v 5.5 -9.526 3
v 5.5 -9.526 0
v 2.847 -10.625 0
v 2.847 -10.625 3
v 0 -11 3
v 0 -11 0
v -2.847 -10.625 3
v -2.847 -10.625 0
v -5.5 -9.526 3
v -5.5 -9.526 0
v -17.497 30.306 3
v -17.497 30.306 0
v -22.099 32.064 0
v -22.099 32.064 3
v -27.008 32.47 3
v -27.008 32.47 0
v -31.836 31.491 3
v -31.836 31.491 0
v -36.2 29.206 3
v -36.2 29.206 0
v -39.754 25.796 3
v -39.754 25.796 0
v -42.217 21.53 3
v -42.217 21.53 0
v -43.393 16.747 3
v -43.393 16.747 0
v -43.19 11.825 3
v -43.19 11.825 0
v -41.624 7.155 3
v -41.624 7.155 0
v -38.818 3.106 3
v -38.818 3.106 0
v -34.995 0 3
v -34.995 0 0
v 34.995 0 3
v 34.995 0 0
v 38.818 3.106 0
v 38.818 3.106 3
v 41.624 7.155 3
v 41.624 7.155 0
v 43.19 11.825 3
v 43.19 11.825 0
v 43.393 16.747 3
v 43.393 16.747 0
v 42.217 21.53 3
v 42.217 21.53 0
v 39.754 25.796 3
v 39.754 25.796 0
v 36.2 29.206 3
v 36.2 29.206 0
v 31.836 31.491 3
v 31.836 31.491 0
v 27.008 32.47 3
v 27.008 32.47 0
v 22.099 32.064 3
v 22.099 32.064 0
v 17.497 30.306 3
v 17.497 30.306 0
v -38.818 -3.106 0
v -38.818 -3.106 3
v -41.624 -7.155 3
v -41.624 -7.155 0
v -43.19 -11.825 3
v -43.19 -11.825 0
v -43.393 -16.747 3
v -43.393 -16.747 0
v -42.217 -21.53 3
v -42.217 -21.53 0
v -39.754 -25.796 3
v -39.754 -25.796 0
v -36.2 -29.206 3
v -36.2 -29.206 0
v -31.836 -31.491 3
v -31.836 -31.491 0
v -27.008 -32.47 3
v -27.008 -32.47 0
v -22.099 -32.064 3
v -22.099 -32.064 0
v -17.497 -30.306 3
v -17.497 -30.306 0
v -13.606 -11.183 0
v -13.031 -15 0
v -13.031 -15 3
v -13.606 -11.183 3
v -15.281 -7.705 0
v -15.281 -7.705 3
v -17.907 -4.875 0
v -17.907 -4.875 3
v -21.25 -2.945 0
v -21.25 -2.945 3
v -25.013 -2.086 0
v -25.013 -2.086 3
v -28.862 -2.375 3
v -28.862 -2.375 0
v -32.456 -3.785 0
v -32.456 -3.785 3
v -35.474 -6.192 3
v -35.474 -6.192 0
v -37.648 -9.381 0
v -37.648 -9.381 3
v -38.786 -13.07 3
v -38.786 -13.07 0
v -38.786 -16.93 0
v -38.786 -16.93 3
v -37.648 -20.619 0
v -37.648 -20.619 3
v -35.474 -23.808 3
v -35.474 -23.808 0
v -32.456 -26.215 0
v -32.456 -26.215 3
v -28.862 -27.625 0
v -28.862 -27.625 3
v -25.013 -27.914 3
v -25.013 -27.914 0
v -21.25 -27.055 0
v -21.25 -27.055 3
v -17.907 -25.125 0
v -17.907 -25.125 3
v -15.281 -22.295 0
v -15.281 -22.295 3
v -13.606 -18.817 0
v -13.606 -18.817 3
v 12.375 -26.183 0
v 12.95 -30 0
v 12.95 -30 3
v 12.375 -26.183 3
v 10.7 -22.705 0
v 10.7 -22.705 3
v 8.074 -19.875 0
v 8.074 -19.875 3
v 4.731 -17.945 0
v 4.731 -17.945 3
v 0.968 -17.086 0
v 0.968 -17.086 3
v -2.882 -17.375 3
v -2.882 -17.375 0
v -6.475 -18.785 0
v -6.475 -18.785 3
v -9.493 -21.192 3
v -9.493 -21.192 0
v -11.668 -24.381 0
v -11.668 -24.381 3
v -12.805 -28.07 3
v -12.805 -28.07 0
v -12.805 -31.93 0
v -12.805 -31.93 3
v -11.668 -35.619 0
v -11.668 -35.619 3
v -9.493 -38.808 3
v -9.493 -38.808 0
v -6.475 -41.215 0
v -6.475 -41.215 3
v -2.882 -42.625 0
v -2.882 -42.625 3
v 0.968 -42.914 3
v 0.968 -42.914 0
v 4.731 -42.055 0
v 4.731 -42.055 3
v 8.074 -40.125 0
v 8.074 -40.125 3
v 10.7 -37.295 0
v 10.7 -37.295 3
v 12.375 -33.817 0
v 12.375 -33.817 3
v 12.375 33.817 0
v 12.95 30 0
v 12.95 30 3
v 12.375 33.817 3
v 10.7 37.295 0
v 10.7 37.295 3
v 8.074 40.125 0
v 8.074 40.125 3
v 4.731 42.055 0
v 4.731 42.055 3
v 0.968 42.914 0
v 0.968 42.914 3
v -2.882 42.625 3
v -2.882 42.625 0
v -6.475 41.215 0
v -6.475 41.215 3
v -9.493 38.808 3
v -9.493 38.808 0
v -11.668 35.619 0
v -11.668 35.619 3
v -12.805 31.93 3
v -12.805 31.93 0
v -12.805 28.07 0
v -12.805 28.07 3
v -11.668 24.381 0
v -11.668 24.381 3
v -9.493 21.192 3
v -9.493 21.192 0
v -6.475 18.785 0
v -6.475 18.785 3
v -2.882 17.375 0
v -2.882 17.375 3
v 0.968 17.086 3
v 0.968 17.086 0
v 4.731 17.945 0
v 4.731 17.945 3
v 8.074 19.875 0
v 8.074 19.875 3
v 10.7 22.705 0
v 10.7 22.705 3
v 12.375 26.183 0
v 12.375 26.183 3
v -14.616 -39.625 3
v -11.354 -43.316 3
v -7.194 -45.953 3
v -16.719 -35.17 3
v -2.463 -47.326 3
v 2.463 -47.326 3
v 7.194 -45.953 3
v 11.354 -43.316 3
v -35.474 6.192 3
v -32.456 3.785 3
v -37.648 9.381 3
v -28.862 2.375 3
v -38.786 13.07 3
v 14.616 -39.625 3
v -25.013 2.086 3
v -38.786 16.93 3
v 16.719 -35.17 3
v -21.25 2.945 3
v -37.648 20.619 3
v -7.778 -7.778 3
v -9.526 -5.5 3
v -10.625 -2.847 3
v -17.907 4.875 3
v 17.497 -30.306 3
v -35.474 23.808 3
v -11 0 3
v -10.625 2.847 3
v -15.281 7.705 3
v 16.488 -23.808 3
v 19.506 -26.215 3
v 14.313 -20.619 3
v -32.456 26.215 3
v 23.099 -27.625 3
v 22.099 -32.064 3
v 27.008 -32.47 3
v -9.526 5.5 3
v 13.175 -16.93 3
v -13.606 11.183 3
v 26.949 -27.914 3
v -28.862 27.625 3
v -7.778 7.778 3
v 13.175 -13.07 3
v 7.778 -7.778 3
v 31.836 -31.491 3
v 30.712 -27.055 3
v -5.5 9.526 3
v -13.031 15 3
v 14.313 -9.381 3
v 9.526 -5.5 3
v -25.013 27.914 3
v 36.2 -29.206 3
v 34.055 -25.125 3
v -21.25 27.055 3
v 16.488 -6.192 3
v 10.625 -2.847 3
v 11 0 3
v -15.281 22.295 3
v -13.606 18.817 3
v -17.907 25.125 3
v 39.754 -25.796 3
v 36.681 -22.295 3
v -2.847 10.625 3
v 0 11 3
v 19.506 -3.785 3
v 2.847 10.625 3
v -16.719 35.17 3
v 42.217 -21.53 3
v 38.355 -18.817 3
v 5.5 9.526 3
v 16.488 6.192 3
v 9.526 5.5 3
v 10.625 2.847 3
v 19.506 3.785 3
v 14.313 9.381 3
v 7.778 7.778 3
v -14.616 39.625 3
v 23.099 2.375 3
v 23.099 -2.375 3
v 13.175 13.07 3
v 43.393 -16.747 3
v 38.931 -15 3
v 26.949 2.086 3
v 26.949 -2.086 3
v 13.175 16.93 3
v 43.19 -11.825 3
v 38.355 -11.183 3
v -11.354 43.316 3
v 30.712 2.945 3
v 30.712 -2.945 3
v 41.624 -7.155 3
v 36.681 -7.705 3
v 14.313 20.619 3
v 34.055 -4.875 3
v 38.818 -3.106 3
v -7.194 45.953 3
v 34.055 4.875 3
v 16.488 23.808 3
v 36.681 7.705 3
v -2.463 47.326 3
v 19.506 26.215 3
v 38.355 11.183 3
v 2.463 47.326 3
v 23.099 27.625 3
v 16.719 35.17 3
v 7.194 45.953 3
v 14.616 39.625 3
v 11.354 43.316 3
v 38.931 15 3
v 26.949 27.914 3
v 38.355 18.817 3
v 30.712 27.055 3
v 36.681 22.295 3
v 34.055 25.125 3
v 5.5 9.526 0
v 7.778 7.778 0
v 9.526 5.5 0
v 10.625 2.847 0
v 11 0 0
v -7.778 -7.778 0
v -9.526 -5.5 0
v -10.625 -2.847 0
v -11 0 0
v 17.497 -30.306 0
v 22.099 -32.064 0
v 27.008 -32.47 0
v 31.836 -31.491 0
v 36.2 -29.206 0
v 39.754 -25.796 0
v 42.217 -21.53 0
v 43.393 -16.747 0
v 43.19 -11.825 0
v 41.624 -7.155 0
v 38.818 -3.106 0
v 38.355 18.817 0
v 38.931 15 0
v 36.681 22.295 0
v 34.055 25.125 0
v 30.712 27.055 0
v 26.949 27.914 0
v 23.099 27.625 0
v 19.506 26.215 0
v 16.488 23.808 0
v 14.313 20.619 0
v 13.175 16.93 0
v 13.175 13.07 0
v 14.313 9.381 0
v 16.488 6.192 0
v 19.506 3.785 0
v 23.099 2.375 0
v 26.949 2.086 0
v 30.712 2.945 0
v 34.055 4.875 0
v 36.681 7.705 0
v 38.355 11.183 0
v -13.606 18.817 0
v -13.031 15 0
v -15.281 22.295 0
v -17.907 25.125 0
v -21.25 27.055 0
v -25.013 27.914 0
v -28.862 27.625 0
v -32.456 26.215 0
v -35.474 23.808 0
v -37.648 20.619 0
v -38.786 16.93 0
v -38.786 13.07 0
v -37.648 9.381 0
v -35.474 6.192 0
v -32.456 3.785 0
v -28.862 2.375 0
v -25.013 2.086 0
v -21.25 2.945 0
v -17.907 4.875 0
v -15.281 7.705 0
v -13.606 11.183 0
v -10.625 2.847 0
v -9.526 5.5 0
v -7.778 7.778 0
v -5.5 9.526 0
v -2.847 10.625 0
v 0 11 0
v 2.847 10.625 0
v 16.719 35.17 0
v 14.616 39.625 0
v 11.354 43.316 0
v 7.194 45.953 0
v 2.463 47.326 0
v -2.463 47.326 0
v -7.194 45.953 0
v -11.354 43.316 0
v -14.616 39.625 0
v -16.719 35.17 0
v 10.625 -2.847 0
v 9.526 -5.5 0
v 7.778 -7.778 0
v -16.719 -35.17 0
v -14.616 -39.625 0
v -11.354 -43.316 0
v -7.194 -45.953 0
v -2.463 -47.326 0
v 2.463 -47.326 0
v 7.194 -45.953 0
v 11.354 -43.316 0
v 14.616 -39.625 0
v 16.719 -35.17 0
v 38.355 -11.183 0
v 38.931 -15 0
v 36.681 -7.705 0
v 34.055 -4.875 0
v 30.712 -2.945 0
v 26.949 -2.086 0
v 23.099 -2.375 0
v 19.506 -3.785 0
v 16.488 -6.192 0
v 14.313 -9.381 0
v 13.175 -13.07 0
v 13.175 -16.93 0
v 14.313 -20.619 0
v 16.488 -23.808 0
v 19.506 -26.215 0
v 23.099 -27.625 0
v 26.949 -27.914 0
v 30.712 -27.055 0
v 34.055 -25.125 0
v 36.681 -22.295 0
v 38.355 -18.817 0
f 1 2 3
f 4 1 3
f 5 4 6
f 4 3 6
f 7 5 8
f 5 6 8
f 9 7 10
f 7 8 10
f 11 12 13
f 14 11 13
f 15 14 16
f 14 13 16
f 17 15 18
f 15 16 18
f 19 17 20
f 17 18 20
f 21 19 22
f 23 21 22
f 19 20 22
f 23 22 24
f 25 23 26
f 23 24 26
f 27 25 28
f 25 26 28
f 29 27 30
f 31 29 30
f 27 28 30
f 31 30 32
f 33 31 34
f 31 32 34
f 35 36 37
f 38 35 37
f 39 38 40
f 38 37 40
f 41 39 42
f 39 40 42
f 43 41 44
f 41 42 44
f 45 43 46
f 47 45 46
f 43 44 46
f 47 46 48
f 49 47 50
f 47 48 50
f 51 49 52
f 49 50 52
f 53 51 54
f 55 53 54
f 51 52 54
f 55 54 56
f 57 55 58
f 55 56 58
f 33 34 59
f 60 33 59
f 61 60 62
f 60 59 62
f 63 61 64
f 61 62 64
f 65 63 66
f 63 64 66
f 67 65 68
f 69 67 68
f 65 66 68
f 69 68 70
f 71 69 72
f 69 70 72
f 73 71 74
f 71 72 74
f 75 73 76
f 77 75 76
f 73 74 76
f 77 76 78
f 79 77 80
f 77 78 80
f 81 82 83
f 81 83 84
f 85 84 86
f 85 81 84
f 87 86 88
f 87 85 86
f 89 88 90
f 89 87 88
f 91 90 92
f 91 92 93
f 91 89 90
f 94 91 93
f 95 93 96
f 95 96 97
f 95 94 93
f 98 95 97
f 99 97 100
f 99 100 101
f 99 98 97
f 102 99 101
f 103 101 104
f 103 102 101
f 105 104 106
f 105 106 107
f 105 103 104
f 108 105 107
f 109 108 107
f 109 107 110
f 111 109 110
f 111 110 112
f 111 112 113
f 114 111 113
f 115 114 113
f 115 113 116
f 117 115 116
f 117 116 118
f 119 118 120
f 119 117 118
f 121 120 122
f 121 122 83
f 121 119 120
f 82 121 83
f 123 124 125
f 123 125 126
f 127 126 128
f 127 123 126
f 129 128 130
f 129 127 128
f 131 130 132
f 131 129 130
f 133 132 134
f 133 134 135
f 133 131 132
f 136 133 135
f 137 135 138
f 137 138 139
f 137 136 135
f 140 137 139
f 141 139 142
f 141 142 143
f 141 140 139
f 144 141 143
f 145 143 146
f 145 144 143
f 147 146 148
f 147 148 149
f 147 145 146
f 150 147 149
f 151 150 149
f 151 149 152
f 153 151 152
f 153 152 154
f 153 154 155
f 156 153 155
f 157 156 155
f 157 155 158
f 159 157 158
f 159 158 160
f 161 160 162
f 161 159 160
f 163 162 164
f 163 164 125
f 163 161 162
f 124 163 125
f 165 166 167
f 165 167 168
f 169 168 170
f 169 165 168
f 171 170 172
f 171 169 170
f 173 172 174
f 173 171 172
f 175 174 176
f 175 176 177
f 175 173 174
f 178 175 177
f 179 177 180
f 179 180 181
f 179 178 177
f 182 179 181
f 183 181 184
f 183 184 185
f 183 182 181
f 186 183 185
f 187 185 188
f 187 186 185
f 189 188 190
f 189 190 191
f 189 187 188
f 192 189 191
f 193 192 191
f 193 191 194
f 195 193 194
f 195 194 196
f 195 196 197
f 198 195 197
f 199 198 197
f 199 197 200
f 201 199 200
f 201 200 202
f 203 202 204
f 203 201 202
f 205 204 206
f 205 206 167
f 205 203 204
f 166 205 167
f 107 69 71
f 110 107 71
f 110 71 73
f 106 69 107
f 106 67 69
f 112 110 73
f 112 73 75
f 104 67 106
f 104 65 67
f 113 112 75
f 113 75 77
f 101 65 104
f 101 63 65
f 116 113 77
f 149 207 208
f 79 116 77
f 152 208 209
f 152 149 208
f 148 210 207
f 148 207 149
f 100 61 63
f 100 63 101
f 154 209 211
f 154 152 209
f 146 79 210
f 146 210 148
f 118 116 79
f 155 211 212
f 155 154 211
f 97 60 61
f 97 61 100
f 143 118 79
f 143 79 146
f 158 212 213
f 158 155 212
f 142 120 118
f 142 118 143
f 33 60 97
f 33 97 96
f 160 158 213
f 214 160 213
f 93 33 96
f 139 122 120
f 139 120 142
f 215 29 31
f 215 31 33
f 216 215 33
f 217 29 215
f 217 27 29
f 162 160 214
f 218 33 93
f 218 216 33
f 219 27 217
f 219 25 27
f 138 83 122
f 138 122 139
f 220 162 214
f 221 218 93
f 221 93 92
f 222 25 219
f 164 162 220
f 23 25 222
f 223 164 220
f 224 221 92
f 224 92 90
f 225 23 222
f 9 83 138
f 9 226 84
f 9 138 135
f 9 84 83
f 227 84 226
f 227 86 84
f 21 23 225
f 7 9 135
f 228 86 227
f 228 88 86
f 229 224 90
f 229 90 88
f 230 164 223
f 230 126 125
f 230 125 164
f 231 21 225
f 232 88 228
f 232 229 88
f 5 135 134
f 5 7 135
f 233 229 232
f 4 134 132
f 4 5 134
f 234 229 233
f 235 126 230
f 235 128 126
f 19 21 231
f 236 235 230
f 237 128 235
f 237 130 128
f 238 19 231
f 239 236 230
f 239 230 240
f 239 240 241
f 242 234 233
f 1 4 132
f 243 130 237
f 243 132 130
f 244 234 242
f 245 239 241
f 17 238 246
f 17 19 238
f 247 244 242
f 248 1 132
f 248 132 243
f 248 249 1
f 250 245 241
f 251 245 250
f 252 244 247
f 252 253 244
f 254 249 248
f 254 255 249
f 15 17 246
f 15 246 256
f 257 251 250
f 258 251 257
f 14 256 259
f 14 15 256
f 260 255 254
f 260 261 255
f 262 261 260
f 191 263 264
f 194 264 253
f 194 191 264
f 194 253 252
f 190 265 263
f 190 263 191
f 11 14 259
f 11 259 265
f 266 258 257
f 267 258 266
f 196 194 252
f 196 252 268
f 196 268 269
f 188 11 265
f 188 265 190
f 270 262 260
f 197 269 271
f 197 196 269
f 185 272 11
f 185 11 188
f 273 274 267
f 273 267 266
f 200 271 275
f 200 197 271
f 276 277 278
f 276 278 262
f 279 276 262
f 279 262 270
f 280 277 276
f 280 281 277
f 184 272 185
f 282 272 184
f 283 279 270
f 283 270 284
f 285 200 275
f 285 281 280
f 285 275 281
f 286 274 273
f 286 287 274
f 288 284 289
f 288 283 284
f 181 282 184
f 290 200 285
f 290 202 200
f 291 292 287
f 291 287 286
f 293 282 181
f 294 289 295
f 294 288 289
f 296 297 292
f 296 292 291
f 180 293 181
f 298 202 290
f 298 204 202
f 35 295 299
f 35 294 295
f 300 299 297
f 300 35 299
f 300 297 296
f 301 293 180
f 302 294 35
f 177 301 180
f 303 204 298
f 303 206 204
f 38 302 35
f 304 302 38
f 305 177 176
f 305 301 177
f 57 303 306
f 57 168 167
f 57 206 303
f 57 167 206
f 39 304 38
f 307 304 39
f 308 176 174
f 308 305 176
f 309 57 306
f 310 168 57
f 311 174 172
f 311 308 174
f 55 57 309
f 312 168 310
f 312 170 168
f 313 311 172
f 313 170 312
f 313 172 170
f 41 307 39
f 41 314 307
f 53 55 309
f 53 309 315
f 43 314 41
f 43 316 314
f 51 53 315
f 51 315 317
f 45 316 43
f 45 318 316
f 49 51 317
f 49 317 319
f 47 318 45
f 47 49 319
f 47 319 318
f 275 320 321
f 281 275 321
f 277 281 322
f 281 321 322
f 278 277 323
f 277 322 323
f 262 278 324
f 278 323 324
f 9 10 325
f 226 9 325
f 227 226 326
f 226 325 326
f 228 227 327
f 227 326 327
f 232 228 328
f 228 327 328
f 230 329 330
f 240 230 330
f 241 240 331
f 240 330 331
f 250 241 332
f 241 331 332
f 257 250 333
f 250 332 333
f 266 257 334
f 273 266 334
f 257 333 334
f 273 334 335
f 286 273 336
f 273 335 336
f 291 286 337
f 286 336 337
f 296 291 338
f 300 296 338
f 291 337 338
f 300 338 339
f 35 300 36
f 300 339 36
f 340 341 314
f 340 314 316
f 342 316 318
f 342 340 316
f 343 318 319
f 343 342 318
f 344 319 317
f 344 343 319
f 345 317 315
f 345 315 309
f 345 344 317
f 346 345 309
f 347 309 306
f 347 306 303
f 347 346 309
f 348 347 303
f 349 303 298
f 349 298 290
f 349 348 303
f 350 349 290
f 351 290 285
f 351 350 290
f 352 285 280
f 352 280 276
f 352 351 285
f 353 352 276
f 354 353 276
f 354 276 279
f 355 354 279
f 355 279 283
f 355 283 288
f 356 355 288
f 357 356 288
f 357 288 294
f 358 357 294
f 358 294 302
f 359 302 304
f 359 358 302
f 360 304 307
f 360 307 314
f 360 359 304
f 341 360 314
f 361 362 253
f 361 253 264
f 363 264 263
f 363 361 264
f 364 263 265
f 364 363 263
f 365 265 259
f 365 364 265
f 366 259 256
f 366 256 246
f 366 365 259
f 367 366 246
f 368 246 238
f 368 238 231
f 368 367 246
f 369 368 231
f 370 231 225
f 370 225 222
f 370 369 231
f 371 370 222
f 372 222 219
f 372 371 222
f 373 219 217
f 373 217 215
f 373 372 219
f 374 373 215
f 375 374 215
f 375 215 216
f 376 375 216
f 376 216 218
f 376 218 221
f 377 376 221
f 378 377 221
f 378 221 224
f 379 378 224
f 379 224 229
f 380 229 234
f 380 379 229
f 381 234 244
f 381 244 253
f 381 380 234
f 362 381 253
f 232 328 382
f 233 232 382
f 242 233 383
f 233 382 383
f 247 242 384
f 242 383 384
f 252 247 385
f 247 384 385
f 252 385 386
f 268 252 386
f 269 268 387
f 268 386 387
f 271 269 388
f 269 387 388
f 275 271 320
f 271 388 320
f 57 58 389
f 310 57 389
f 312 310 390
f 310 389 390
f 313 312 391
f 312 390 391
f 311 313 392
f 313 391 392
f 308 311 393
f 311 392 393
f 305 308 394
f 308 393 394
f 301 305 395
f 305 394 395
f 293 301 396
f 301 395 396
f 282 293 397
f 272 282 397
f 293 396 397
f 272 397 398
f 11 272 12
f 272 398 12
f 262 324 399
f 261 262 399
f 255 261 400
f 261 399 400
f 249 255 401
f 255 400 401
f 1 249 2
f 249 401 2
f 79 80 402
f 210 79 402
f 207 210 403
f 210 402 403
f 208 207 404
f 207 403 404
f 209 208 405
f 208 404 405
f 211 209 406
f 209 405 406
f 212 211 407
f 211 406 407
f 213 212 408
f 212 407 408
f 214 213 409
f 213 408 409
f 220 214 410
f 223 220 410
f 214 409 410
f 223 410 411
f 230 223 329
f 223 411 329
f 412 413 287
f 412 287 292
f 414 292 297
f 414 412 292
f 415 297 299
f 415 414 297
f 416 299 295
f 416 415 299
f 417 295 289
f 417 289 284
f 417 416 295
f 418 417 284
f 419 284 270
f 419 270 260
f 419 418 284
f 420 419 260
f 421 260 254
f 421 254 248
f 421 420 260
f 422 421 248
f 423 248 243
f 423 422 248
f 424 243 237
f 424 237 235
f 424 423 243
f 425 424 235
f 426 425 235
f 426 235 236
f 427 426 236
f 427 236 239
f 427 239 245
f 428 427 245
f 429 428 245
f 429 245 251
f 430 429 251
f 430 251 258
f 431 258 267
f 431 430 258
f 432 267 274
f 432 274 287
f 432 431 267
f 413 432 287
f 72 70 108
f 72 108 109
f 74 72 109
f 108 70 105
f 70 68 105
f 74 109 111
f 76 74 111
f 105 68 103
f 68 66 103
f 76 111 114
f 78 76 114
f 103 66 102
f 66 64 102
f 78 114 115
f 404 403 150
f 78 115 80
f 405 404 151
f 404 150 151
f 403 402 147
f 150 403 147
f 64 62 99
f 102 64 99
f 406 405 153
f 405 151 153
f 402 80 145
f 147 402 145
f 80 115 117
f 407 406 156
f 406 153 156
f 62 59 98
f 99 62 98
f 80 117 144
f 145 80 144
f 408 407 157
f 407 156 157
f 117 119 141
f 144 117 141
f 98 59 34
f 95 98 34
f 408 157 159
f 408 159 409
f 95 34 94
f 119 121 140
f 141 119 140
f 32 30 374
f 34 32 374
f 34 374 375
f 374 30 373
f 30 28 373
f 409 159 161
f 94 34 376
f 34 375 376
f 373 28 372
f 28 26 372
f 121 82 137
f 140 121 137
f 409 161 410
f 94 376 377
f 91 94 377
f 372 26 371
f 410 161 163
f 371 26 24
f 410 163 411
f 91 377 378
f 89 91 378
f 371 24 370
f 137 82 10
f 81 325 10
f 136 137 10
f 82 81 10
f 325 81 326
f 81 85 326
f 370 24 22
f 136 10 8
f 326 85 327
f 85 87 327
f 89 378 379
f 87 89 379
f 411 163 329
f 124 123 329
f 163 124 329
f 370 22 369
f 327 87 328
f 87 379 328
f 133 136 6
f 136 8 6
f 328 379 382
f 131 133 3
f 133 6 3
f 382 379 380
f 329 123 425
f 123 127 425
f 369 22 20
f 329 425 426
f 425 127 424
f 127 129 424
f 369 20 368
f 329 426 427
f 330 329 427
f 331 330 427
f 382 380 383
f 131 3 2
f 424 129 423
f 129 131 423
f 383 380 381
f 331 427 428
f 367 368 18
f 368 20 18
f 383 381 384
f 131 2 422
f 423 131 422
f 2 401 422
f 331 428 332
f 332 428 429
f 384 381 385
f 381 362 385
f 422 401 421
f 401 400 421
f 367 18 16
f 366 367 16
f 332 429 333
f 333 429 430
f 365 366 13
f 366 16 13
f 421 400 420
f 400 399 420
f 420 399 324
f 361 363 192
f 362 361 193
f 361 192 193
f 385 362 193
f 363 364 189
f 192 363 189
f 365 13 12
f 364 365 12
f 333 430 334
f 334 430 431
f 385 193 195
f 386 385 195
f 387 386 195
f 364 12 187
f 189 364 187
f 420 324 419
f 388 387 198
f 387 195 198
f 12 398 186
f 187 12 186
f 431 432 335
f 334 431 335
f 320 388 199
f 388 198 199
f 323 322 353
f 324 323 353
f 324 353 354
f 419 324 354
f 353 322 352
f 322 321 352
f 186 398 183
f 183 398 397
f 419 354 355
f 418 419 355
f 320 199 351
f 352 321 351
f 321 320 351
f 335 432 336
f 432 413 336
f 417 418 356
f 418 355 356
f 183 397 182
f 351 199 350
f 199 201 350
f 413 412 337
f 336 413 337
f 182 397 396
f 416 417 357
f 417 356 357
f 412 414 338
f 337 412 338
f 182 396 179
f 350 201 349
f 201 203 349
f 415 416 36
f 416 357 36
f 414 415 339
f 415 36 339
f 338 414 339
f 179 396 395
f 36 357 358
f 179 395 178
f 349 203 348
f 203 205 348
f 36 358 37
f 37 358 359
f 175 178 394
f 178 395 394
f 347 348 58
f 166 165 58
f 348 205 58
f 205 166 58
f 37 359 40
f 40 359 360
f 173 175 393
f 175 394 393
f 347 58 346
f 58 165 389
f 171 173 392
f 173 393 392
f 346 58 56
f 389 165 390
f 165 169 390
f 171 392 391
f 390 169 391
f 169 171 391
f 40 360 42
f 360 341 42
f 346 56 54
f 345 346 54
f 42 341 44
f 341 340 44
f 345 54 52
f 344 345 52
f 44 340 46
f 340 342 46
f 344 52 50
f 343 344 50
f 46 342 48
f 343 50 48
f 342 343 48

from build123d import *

# Parameters (mm, degrees)
F0_R     = 12.95
F1_DEPTH = 3


with BuildPart() as f1:
    # F0 (on Top) → F1 (new body)
    with BuildSketch(Plane.XY):
        with BuildLine():
            ThreePointArc((34.99464, 0), (41.136207, 23.75), (17.49732, 30.306247))
            ThreePointArc((17.49732, 30.306247), (0, 47.5), (-17.49732, 30.306247))
            ThreePointArc((-17.49732, 30.306247), (-41.136207, 23.75), (-34.99464, 0))
            ThreePointArc((-34.99464, 0), (-41.136207, -23.75), (-17.49732, -30.306247))
            ThreePointArc((-17.49732, -30.306247), (0, -47.5), (17.49732, -30.306247))
            ThreePointArc((17.49732, -30.306247), (41.136207, -23.75), (34.99464, 0))
        make_face()
        with Locations((-25.980762, -15)):
            Circle(F0_R, mode=Mode.SUBTRACT)
        with Locations((0, -30)):
            Circle(F0_R, mode=Mode.SUBTRACT)
        with Locations((25.980762, -15)):
            Circle(F0_R, mode=Mode.SUBTRACT)
        with Locations((-25.980762, 15)):
            Circle(F0_R, mode=Mode.SUBTRACT)
        with BuildLine():
            ThreePointArc((-5.5, 9.526279), (0, 11), (5.5, 9.526279))
            ThreePointArc((5.5, 9.526279), (9.526279, 5.5), (11, 0))
            ThreePointArc((11, 0), (9.526279, -5.5), (5.5, -9.526279))
            ThreePointArc((5.5, -9.526279), (0, -11), (-5.5, -9.526279))
            ThreePointArc((-5.5, -9.526279), (-9.526279, -5.5), (-11, 0))
            ThreePointArc((-11, 0), (-9.526279, 5.5), (-5.5, 9.526279))
        make_face(mode=Mode.SUBTRACT)
        with Locations((25.980762, 15)):
            Circle(F0_R, mode=Mode.SUBTRACT)
        with Locations((0, 30)):
            Circle(F0_R, mode=Mode.SUBTRACT)
    extrude(amount=F1_DEPTH)


solid = f1.part
